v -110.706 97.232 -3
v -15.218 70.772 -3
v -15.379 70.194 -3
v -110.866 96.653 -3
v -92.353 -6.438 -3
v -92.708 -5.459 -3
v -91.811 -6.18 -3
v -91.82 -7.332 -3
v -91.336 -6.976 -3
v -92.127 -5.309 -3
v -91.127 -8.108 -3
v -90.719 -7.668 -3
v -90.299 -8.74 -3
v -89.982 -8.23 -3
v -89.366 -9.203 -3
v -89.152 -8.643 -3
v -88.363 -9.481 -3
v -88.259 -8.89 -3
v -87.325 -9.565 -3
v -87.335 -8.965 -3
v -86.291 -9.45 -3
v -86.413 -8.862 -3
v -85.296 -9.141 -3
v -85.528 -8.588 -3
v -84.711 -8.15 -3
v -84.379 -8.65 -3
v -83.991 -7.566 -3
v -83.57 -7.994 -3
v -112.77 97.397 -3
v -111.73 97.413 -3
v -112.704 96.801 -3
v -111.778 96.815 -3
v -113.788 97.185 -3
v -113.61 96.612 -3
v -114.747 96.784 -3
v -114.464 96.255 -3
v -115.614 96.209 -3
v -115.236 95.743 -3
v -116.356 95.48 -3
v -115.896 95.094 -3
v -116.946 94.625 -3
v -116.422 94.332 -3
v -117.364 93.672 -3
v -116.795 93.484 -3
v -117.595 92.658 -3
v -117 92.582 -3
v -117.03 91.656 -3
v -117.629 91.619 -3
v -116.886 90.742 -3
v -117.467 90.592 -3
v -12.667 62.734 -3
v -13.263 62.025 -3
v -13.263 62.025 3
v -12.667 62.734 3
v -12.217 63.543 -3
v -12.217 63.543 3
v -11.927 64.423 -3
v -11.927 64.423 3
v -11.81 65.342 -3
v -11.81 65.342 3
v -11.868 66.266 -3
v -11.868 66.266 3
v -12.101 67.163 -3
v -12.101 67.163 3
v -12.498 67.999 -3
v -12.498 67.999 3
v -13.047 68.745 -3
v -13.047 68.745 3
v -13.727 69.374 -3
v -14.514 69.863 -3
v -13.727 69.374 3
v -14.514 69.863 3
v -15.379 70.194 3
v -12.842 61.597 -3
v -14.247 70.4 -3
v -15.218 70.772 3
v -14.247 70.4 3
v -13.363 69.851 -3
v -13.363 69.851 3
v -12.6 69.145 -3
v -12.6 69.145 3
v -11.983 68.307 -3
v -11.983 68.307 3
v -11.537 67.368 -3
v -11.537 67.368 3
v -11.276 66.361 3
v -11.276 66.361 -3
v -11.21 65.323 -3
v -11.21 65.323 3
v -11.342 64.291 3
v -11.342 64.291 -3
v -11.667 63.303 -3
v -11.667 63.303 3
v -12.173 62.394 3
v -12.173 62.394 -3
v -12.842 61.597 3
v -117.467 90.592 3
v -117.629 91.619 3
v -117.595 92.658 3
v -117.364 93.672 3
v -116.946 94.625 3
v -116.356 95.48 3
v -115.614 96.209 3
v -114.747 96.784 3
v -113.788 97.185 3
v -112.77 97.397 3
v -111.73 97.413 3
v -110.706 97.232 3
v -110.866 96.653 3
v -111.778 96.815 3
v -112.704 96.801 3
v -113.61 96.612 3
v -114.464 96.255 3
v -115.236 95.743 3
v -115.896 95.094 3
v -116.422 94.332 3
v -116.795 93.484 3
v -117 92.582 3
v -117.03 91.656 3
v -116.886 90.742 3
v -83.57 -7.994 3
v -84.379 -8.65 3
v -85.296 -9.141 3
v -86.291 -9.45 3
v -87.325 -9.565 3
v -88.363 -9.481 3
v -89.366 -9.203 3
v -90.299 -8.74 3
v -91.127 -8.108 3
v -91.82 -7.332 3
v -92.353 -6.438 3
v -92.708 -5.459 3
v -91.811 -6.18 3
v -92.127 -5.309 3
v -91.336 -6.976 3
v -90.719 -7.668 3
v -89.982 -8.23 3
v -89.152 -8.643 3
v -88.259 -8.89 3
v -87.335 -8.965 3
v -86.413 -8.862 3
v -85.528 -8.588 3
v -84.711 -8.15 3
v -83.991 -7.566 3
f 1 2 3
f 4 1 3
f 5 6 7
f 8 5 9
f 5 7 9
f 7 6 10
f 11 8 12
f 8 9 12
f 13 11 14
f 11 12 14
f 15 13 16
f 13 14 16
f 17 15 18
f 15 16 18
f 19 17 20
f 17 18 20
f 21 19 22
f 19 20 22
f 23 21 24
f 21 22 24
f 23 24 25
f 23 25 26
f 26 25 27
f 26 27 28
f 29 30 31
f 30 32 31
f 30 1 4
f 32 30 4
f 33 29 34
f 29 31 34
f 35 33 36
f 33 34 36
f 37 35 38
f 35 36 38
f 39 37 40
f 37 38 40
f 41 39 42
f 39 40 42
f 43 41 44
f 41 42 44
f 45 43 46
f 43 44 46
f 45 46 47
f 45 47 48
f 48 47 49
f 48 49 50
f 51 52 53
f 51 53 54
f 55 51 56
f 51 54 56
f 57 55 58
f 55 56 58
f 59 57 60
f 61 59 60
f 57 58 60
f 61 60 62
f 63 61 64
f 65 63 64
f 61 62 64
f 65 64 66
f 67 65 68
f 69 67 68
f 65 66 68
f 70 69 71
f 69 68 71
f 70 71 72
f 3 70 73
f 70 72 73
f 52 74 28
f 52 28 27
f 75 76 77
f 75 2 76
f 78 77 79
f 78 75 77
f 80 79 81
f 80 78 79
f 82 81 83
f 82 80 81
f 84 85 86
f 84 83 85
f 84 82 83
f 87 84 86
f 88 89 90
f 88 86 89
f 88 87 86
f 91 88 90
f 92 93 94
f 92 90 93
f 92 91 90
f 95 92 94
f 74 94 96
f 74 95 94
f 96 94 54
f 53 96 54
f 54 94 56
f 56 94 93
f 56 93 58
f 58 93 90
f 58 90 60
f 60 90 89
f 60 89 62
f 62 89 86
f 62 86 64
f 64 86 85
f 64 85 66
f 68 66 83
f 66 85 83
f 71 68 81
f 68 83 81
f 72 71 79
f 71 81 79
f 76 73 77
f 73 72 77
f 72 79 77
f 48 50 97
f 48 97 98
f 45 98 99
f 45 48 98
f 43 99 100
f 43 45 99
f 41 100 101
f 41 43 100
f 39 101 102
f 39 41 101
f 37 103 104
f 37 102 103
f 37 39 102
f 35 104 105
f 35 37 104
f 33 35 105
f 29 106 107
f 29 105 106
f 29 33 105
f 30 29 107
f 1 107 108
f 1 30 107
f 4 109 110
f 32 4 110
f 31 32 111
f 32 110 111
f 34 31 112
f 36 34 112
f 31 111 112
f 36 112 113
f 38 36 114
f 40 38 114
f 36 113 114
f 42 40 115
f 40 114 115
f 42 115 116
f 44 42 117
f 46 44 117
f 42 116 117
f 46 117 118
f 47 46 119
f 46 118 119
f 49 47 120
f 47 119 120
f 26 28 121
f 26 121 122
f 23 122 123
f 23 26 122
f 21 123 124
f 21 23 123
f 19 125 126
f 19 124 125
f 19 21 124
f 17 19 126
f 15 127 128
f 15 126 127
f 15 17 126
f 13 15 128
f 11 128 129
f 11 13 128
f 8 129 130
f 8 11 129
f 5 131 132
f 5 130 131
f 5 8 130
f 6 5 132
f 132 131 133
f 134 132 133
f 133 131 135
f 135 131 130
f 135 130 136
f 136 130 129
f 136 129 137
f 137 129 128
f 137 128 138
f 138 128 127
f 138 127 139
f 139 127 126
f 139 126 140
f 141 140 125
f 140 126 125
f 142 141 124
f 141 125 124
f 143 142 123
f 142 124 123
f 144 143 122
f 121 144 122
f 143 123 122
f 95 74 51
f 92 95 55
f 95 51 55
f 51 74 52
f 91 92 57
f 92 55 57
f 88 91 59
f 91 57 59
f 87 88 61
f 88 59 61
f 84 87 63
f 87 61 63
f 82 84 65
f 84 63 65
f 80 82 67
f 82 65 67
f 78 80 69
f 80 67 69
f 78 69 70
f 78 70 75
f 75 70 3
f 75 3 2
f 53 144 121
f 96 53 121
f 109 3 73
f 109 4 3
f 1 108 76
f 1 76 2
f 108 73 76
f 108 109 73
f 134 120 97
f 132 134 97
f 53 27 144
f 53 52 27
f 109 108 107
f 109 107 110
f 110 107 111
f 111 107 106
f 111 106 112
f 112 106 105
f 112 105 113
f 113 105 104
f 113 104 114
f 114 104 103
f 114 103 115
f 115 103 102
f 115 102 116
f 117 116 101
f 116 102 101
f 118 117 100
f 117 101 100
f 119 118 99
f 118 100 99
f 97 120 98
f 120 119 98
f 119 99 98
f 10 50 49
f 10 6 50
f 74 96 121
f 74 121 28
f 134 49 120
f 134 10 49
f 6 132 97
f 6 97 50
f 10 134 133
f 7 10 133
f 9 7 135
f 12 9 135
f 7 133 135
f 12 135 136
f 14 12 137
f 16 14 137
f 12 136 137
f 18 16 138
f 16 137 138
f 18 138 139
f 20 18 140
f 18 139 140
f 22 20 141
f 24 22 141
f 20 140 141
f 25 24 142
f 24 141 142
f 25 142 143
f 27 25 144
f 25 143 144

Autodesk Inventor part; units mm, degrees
sketch "Skizzenpfad" plane through (0, 0, 0) normal (0, 0, 1) x (1, 0, 0)
  arc A0 (-110.786, 96.9426) -> (-117.1761, 90.6668) centre (-112.1673, 91.9579) ccw
  arc A1 (-13.0522, 61.811) -> (-15.2986, 70.4828) centre (-16.6799, 65.4981) ccw
  arc A2 (-92.4173, -5.3838) -> (-83.7808, -7.7797) centre (-87.4085, -4.0927) ccw
  line L0 (-92.4173, -5.3838) -> (-117.1761, 90.6668)
  line L1 (-110.786, 96.9426) -> (-15.2986, 70.4828)
  line L2 (-13.0522, 61.811) -> (-83.7808, -7.7797)
ref_plane "Querschnittsebene" through (-117.1761, 90.6668, 0) normal (0.2496, -0.9683, 0) x (0, 0, 1)
ref_plane "Arbeitsebene2" through (-112.1673, 91.9579, 0) normal (-1, 0, 0) x (0, 0, 1)
ref_plane "Arbeitsebene3" through (-16.6799, 65.4981, 0) normal (-0.7899, 0.6132, 0) x (0, 0, 1)
ref_plane "Arbeitsebene4" through (-87.4085, -4.0927, 0) normal (0.9218, 0.3878, 0) x (0, 0, 1)
sketch "Querschnitt" plane through (-117.1761, 90.6668, 0) normal (0.2496, -0.9683, 0) x (0, 0, 1)
  line L0 (-3, 0.3) -> (3, 0.3)
  line L1 (3, 0.3) -> (3, -0.3)
  line L2 (3, -0.3) -> (-3, -0.3)
  line L3 (-3, -0.3) -> (-3, 0.3)
  line L4 (-3, 0) -> (3, 0) construction
  point P0 (0, 0)
  point P1 (0, 0)
  dimension "d0" = 6
  dimension "d4" = 0.3
  dimension "d5" = 0.3
sweep "Riemen" add profiles "Querschnitt" path "Skizzenpfad"
equation "\"d0\" = da_B"
equation "\"d4\" = da_a"
equation "\"d5\" = da_a2"
equation "\"da_B\" = 6"
equation "\"da_pb\" = 2.5"
equation "\"da_a\" = 0.3"
equation "\"da_S\" = 1.5"
equation "\"da_Beta\" = 20deg"
equation "\"da_Ht\" = 0.7"
equation "\"da_H\" = 1.3"
equation "\"da_a2\" = 0.3"
properties part number "Zahnriemen" material "Rubber"
